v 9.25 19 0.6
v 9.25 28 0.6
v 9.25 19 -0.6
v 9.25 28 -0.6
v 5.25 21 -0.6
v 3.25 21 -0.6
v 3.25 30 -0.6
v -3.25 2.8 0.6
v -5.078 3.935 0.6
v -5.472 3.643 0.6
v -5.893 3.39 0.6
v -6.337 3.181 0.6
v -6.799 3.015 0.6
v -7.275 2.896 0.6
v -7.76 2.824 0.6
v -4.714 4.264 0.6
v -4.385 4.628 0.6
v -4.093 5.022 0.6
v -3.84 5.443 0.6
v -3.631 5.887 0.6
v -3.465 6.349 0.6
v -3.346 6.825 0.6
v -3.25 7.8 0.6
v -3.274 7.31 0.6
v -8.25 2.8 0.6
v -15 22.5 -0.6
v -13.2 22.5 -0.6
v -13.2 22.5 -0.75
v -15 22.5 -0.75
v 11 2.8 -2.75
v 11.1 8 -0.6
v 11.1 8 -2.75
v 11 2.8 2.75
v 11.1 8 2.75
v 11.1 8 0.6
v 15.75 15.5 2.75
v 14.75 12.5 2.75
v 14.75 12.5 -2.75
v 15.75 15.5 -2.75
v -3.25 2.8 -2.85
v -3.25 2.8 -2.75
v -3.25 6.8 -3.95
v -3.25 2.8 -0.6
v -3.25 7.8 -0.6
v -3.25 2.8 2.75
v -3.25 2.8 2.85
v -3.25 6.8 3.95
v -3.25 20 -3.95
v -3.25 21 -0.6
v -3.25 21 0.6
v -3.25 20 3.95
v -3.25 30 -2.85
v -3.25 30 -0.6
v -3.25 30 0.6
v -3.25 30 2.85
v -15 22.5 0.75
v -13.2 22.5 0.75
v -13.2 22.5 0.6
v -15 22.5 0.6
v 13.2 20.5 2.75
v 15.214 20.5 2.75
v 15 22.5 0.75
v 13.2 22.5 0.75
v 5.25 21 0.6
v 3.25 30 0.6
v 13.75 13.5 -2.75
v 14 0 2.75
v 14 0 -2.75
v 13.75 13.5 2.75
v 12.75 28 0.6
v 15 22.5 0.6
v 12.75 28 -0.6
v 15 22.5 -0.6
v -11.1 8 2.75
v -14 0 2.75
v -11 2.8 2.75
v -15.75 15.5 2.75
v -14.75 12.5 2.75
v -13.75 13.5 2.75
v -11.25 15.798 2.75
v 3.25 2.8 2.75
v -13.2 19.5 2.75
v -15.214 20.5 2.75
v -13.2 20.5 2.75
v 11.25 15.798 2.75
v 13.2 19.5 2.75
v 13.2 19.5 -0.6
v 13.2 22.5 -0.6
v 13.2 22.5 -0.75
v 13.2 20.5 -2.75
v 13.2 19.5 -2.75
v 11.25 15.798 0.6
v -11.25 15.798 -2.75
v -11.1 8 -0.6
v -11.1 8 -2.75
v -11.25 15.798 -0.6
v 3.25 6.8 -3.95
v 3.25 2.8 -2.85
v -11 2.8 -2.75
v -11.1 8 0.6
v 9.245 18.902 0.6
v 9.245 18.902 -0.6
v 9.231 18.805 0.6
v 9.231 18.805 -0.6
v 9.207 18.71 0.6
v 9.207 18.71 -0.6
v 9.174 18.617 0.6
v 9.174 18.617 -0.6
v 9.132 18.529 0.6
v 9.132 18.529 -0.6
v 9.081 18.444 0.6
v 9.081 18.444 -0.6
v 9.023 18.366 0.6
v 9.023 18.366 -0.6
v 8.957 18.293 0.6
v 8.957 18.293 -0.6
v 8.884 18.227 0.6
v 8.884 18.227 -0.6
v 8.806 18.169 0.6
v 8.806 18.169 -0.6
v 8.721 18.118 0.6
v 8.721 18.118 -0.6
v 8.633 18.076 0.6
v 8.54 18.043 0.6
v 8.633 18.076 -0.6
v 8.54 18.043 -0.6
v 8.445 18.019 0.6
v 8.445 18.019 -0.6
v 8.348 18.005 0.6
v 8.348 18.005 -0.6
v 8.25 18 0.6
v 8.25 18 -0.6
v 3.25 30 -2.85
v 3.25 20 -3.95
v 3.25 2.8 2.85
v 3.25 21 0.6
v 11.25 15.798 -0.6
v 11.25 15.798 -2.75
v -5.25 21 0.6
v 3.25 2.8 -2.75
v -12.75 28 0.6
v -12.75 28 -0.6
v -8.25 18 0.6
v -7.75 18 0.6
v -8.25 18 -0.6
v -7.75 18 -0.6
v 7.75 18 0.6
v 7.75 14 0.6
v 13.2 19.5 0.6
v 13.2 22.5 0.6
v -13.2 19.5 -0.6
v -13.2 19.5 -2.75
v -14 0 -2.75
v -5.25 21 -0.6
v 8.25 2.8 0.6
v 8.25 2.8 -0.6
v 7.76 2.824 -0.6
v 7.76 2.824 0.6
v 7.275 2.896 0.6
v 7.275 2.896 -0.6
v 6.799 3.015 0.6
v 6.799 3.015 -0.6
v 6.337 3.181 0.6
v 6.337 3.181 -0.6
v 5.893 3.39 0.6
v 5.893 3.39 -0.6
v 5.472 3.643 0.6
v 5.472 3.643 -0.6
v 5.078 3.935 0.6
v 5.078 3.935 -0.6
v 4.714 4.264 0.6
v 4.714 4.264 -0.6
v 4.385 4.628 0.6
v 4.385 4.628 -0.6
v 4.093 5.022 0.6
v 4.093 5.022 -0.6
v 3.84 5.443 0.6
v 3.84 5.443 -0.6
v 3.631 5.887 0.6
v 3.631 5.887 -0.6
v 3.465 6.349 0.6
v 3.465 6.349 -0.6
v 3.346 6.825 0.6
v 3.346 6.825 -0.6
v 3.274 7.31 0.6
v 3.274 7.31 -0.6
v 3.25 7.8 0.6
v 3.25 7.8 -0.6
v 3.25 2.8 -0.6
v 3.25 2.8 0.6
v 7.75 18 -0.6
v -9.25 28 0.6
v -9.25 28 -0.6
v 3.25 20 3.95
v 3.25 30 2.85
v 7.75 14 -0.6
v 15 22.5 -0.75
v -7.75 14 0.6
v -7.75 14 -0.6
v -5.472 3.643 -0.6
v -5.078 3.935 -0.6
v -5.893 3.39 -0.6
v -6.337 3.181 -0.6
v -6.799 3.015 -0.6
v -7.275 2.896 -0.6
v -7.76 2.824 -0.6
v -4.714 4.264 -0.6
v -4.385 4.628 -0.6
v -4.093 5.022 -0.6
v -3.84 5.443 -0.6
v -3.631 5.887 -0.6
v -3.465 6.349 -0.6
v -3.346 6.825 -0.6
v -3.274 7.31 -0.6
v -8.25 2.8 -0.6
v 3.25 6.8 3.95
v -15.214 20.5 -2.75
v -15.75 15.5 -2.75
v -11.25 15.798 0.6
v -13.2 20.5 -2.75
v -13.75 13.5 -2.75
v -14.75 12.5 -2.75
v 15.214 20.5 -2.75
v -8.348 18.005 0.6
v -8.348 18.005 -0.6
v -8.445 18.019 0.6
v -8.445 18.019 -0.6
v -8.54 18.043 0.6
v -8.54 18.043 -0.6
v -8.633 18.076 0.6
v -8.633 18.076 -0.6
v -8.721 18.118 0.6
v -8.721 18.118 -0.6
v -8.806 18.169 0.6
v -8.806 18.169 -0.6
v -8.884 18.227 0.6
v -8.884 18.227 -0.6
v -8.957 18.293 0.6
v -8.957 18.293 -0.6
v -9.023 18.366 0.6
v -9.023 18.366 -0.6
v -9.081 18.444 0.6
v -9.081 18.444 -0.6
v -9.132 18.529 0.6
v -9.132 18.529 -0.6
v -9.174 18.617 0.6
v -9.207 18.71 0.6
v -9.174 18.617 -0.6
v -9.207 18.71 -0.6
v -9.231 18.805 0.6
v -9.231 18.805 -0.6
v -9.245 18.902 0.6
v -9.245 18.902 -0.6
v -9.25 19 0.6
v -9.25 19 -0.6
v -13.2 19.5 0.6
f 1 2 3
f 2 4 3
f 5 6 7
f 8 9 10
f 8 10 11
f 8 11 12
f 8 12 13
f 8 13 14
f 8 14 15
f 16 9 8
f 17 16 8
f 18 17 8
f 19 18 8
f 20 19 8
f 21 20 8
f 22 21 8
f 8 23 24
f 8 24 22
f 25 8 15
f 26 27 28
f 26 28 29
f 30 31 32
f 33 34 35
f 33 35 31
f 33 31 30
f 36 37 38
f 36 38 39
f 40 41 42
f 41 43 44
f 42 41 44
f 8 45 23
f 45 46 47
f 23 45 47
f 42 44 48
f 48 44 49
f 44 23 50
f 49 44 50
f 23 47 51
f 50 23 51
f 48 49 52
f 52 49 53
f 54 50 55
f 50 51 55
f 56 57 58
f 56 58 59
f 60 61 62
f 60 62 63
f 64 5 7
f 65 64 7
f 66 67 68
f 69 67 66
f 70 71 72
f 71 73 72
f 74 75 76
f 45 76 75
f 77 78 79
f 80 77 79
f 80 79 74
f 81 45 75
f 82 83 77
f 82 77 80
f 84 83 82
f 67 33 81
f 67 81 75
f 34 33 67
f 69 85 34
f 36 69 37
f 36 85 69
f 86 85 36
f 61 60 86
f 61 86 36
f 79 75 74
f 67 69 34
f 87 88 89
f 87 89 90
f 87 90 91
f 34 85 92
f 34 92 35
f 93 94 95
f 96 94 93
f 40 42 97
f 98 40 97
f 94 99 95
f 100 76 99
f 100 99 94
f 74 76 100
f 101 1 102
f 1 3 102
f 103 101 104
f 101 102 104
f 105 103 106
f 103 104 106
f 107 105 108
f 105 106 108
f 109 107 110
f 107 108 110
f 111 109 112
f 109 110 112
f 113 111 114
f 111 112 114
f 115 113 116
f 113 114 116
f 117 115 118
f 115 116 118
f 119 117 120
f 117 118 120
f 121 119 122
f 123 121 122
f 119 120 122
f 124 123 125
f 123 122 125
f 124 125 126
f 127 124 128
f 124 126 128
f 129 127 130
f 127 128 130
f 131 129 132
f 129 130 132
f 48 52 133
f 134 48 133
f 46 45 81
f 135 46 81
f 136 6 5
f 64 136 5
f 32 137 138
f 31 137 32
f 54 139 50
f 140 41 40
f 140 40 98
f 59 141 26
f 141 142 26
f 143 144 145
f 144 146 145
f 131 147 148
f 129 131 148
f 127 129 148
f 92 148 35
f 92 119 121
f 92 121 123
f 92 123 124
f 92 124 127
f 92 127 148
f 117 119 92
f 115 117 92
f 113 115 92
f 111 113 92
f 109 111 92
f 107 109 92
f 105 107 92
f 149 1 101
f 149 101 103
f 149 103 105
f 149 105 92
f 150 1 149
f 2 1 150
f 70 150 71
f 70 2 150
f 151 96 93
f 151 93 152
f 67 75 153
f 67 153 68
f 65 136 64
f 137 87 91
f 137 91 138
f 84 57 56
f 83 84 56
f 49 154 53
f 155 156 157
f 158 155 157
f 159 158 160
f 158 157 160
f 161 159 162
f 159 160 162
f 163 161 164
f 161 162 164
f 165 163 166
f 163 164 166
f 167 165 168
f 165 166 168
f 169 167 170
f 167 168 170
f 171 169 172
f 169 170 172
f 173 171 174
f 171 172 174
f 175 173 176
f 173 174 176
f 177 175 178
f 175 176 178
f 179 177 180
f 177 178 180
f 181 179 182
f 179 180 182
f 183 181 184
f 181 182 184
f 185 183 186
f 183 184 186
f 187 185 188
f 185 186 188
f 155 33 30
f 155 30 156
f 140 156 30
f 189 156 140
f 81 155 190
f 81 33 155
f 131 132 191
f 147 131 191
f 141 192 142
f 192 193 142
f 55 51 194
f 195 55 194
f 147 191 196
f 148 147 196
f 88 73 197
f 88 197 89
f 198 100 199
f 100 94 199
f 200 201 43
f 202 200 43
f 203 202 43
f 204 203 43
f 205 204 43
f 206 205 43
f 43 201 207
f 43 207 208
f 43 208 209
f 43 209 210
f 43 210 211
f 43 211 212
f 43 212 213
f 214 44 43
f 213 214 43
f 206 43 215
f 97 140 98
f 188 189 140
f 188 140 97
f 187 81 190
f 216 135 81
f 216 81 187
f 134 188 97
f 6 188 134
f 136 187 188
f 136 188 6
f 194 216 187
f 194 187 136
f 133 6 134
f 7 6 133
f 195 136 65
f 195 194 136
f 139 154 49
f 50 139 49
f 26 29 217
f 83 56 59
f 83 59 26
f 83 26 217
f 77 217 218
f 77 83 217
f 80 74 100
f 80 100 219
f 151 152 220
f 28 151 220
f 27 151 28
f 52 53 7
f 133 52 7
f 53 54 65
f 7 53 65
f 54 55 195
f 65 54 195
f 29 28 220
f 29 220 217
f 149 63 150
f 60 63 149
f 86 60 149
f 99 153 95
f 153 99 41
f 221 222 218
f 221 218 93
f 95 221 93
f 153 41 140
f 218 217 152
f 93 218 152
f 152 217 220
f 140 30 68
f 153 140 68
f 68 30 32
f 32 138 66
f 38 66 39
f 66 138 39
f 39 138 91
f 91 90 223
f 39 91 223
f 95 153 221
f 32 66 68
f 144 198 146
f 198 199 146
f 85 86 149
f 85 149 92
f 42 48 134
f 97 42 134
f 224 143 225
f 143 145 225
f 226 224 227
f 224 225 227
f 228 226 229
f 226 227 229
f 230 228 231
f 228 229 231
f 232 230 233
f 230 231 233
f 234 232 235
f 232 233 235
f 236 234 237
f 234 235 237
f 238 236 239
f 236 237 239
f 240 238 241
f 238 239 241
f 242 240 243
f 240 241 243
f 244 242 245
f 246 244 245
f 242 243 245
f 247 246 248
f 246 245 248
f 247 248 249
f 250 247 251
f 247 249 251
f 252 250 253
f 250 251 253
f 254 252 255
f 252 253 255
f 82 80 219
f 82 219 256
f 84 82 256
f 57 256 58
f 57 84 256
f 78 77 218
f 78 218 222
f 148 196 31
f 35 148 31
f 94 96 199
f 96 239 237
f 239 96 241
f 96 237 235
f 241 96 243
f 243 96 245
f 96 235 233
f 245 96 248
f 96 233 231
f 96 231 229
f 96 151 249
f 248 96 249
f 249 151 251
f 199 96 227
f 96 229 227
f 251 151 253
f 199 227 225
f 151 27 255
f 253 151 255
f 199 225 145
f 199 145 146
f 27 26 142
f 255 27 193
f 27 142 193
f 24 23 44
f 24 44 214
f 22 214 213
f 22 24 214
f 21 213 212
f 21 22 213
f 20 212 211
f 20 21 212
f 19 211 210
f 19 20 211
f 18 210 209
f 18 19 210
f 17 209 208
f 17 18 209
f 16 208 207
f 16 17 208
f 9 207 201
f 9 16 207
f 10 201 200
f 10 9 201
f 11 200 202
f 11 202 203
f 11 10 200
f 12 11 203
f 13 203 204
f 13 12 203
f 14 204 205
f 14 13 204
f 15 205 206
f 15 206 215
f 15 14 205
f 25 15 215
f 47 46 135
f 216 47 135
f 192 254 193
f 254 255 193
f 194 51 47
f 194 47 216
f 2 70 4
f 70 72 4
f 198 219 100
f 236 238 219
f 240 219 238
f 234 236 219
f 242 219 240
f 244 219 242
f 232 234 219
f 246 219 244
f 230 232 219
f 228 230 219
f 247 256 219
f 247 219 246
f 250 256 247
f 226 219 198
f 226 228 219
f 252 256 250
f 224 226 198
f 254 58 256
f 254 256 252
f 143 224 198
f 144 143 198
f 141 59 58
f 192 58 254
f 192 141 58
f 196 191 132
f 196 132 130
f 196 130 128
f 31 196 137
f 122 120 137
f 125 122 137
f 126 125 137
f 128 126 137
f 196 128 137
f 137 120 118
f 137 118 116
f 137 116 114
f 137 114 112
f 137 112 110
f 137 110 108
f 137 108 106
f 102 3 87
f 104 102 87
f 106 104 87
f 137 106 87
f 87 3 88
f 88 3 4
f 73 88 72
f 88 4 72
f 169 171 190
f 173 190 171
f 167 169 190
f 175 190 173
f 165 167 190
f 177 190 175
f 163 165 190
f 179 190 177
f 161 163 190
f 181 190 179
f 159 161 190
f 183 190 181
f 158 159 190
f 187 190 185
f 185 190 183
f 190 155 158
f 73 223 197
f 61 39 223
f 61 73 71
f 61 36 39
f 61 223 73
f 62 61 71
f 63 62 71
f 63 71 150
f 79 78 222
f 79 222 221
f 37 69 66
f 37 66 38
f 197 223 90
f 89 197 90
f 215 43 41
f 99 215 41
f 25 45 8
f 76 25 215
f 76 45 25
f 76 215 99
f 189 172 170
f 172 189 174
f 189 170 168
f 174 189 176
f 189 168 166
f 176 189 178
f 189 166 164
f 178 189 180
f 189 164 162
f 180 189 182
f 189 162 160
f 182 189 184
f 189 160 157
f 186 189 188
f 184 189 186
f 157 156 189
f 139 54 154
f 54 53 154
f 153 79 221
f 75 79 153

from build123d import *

# Parameters (mm, degrees)
F1_DEPTH    = 2.75
F2_DEPTH    = 0.6
F3_SIZE     = 2
F4_W        = 6.5
F4_H        = 27.2
F5_DEPTH    = 1.2
F6_C1_SIZE2 = 4
F6_C1_SIZE  = 1.1
F6_C2_SIZE2 = 1.1
F6_C2_SIZE  = 4
F7_C1_SIZE2 = 1.1
F7_C1_SIZE  = 10
F7_C2_SIZE2 = 10
F7_C2_SIZE  = 1.1


# Not quite as in the source:
# - a pattern or mirror of a feature is missing from the dataset's text; its kind, count and spacing are read off the source's solid


with BuildPart() as f1:
    # F0 (on Top) → F1 (new body, symmetric)
    with BuildSketch(Plane.XY):
        Polygon((3.25, 30), (0, 30), (-3.25, 30), (-3.25, 21), (-3.25, 7.8), (-3.25, 2.8), (-8.25, 2.8), (-11, 2.8), (-11.1000184963, 8), (-11.25, 15.7975959316), (-13.2, 19.5), (-13.2, 22.5), (-15, 22.5), (-15.75, 15.5), (-14.75, 12.5), (-13.75, 13.5), (-14, 0), (0, 0), (14, 0), (13.75, 13.5), (14.75, 12.5), (15.75, 15.5), (15, 22.5), (13.2, 22.5), (13.2, 19.5), (11.25, 15.7975959316), (11.1000184963, 8), (11, 2.8), (8.25, 2.8), (3.25, 2.8), (3.25, 7.8), (3.25, 21), align=None)
    extrude(amount=F1_DEPTH, both=True)

    # F0 (on Top) → F2 (join, symmetric)
    with BuildSketch(Plane.XY):
        with BuildLine():
            Line((-11.25, 15.7975959316), (-11.1000184963, 8))
            Line((-11.1000184963, 8), (-7.75, 14))
            Line((-7.75, 14), (-7.75, 18))
            Line((-7.75, 18), (-8.25, 18))
            ThreePointArc((-8.25, 18), (-8.9571067812, 18.2928932188), (-9.25, 19))
            Line((-9.25, 19), (-9.25, 28))
            Line((-9.25, 28), (-12.75, 28))
            Line((-12.75, 28), (-15, 22.5))
            Line((-15, 22.5), (-13.2, 22.5))
            Line((-13.2, 22.5), (-13.2, 19.5))
            Line((-13.2, 19.5), (-11.25, 15.7975959316))
        make_face()
        Polygon((-3.25, 21), (-3.25, 30), (-5.25, 21), align=None)
        Polygon((5.25, 21), (3.25, 30), (3.25, 21), align=None)
        with BuildLine():
            Line((7.75, 14), (11.1000184963, 8))
            Line((11.1000184963, 8), (11.25, 15.7975959316))
            Line((11.25, 15.7975959316), (13.2, 19.5))
            Line((13.2, 19.5), (13.2, 22.5))
            Line((13.2, 22.5), (15, 22.5))
            Line((15, 22.5), (12.75, 28))
            Line((12.75, 28), (9.25, 28))
            Line((9.25, 28), (9.25, 19))
            ThreePointArc((9.25, 19), (8.9571067812, 18.2928932188), (8.25, 18))
            Line((8.25, 18), (7.75, 18))
            Line((7.75, 18), (7.75, 14))
        make_face()
        with BuildLine():
            ThreePointArc((8.25, 2.8), (4.7144660941, 4.2644660941), (3.25, 7.8))
            Line((3.25, 7.8), (3.25, 2.8))
            Line((3.25, 2.8), (8.25, 2.8))
        make_face()
        with BuildLine():
            Line((-3.25, 2.8), (-3.25, 7.8))
            ThreePointArc((-3.25, 7.8), (-4.7144660941, 4.2644660941), (-8.25, 2.8))
            Line((-8.25, 2.8), (-3.25, 2.8))
        make_face()
    extrude(amount=F2_DEPTH, both=True)

    # F3
    f3_edges = [f1.edges().sort_by_distance(p)[0] for p in [
        (14.1, 22.5, 2.75),
        (14.1, 22.5, -2.75),
        (-14.1, 22.5, 2.75),
        (-14.1, 22.5, -2.75),
    ]]
    chamfer(f3_edges, length=F3_SIZE)

    # F4 (on face) → F5 (join)
    with BuildSketch(Plane.XY.offset(2.75)):
        with Locations((0, 16.4)):
            Rectangle(F4_W, F4_H)
    f5 = extrude(amount=F5_DEPTH)

    # F5_copies: F5 across plane
    add(f5.mirror(Plane(origin=(0, 0, 0), x_dir=(-1, 0, 0), z_dir=(0, 0, -1))))

    # F6: chamfer of 4 x 1.1 on 2 edges, made by hand

    # F6_c1
    f6_c1_edges = [f1.edges().sort_by_distance(p)[0] for p in [
        (0, 2.8, -3.95),
    ]]
    f6_c1_side = f1.faces().sort_by_distance((0, 2.8, -3.928))[0]
    chamfer(f6_c1_edges, length=F6_C1_SIZE, length2=F6_C1_SIZE2, reference=f6_c1_side)

    # F6_c2
    f6_c2_edges = [f1.edges().sort_by_distance(p)[0] for p in [
        (0, 2.8, 3.95),
    ]]
    f6_c2_side = f1.faces().sort_by_distance((0, 2.822, 3.95))[0]
    chamfer(f6_c2_edges, length=F6_C2_SIZE, length2=F6_C2_SIZE2, reference=f6_c2_side)

    # F7: chamfer of 1.1 x 10 on 2 edges, made by hand

    # F7_c1
    f7_c1_edges = [f1.edges().sort_by_distance(p)[0] for p in [
        (0, 30, 3.95),
    ]]
    f7_c1_side = f1.faces().sort_by_distance((0, 29.978, 3.95))[0]
    chamfer(f7_c1_edges, length=F7_C1_SIZE, length2=F7_C1_SIZE2, reference=f7_c1_side)

    # F7_c2
    f7_c2_edges = [f1.edges().sort_by_distance(p)[0] for p in [
        (0, 30, -3.95),
    ]]
    f7_c2_side = f1.faces().sort_by_distance((0, 30, -3.928))[0]
    chamfer(f7_c2_edges, length=F7_C2_SIZE, length2=F7_C2_SIZE2, reference=f7_c2_side)


solid = f1.part
